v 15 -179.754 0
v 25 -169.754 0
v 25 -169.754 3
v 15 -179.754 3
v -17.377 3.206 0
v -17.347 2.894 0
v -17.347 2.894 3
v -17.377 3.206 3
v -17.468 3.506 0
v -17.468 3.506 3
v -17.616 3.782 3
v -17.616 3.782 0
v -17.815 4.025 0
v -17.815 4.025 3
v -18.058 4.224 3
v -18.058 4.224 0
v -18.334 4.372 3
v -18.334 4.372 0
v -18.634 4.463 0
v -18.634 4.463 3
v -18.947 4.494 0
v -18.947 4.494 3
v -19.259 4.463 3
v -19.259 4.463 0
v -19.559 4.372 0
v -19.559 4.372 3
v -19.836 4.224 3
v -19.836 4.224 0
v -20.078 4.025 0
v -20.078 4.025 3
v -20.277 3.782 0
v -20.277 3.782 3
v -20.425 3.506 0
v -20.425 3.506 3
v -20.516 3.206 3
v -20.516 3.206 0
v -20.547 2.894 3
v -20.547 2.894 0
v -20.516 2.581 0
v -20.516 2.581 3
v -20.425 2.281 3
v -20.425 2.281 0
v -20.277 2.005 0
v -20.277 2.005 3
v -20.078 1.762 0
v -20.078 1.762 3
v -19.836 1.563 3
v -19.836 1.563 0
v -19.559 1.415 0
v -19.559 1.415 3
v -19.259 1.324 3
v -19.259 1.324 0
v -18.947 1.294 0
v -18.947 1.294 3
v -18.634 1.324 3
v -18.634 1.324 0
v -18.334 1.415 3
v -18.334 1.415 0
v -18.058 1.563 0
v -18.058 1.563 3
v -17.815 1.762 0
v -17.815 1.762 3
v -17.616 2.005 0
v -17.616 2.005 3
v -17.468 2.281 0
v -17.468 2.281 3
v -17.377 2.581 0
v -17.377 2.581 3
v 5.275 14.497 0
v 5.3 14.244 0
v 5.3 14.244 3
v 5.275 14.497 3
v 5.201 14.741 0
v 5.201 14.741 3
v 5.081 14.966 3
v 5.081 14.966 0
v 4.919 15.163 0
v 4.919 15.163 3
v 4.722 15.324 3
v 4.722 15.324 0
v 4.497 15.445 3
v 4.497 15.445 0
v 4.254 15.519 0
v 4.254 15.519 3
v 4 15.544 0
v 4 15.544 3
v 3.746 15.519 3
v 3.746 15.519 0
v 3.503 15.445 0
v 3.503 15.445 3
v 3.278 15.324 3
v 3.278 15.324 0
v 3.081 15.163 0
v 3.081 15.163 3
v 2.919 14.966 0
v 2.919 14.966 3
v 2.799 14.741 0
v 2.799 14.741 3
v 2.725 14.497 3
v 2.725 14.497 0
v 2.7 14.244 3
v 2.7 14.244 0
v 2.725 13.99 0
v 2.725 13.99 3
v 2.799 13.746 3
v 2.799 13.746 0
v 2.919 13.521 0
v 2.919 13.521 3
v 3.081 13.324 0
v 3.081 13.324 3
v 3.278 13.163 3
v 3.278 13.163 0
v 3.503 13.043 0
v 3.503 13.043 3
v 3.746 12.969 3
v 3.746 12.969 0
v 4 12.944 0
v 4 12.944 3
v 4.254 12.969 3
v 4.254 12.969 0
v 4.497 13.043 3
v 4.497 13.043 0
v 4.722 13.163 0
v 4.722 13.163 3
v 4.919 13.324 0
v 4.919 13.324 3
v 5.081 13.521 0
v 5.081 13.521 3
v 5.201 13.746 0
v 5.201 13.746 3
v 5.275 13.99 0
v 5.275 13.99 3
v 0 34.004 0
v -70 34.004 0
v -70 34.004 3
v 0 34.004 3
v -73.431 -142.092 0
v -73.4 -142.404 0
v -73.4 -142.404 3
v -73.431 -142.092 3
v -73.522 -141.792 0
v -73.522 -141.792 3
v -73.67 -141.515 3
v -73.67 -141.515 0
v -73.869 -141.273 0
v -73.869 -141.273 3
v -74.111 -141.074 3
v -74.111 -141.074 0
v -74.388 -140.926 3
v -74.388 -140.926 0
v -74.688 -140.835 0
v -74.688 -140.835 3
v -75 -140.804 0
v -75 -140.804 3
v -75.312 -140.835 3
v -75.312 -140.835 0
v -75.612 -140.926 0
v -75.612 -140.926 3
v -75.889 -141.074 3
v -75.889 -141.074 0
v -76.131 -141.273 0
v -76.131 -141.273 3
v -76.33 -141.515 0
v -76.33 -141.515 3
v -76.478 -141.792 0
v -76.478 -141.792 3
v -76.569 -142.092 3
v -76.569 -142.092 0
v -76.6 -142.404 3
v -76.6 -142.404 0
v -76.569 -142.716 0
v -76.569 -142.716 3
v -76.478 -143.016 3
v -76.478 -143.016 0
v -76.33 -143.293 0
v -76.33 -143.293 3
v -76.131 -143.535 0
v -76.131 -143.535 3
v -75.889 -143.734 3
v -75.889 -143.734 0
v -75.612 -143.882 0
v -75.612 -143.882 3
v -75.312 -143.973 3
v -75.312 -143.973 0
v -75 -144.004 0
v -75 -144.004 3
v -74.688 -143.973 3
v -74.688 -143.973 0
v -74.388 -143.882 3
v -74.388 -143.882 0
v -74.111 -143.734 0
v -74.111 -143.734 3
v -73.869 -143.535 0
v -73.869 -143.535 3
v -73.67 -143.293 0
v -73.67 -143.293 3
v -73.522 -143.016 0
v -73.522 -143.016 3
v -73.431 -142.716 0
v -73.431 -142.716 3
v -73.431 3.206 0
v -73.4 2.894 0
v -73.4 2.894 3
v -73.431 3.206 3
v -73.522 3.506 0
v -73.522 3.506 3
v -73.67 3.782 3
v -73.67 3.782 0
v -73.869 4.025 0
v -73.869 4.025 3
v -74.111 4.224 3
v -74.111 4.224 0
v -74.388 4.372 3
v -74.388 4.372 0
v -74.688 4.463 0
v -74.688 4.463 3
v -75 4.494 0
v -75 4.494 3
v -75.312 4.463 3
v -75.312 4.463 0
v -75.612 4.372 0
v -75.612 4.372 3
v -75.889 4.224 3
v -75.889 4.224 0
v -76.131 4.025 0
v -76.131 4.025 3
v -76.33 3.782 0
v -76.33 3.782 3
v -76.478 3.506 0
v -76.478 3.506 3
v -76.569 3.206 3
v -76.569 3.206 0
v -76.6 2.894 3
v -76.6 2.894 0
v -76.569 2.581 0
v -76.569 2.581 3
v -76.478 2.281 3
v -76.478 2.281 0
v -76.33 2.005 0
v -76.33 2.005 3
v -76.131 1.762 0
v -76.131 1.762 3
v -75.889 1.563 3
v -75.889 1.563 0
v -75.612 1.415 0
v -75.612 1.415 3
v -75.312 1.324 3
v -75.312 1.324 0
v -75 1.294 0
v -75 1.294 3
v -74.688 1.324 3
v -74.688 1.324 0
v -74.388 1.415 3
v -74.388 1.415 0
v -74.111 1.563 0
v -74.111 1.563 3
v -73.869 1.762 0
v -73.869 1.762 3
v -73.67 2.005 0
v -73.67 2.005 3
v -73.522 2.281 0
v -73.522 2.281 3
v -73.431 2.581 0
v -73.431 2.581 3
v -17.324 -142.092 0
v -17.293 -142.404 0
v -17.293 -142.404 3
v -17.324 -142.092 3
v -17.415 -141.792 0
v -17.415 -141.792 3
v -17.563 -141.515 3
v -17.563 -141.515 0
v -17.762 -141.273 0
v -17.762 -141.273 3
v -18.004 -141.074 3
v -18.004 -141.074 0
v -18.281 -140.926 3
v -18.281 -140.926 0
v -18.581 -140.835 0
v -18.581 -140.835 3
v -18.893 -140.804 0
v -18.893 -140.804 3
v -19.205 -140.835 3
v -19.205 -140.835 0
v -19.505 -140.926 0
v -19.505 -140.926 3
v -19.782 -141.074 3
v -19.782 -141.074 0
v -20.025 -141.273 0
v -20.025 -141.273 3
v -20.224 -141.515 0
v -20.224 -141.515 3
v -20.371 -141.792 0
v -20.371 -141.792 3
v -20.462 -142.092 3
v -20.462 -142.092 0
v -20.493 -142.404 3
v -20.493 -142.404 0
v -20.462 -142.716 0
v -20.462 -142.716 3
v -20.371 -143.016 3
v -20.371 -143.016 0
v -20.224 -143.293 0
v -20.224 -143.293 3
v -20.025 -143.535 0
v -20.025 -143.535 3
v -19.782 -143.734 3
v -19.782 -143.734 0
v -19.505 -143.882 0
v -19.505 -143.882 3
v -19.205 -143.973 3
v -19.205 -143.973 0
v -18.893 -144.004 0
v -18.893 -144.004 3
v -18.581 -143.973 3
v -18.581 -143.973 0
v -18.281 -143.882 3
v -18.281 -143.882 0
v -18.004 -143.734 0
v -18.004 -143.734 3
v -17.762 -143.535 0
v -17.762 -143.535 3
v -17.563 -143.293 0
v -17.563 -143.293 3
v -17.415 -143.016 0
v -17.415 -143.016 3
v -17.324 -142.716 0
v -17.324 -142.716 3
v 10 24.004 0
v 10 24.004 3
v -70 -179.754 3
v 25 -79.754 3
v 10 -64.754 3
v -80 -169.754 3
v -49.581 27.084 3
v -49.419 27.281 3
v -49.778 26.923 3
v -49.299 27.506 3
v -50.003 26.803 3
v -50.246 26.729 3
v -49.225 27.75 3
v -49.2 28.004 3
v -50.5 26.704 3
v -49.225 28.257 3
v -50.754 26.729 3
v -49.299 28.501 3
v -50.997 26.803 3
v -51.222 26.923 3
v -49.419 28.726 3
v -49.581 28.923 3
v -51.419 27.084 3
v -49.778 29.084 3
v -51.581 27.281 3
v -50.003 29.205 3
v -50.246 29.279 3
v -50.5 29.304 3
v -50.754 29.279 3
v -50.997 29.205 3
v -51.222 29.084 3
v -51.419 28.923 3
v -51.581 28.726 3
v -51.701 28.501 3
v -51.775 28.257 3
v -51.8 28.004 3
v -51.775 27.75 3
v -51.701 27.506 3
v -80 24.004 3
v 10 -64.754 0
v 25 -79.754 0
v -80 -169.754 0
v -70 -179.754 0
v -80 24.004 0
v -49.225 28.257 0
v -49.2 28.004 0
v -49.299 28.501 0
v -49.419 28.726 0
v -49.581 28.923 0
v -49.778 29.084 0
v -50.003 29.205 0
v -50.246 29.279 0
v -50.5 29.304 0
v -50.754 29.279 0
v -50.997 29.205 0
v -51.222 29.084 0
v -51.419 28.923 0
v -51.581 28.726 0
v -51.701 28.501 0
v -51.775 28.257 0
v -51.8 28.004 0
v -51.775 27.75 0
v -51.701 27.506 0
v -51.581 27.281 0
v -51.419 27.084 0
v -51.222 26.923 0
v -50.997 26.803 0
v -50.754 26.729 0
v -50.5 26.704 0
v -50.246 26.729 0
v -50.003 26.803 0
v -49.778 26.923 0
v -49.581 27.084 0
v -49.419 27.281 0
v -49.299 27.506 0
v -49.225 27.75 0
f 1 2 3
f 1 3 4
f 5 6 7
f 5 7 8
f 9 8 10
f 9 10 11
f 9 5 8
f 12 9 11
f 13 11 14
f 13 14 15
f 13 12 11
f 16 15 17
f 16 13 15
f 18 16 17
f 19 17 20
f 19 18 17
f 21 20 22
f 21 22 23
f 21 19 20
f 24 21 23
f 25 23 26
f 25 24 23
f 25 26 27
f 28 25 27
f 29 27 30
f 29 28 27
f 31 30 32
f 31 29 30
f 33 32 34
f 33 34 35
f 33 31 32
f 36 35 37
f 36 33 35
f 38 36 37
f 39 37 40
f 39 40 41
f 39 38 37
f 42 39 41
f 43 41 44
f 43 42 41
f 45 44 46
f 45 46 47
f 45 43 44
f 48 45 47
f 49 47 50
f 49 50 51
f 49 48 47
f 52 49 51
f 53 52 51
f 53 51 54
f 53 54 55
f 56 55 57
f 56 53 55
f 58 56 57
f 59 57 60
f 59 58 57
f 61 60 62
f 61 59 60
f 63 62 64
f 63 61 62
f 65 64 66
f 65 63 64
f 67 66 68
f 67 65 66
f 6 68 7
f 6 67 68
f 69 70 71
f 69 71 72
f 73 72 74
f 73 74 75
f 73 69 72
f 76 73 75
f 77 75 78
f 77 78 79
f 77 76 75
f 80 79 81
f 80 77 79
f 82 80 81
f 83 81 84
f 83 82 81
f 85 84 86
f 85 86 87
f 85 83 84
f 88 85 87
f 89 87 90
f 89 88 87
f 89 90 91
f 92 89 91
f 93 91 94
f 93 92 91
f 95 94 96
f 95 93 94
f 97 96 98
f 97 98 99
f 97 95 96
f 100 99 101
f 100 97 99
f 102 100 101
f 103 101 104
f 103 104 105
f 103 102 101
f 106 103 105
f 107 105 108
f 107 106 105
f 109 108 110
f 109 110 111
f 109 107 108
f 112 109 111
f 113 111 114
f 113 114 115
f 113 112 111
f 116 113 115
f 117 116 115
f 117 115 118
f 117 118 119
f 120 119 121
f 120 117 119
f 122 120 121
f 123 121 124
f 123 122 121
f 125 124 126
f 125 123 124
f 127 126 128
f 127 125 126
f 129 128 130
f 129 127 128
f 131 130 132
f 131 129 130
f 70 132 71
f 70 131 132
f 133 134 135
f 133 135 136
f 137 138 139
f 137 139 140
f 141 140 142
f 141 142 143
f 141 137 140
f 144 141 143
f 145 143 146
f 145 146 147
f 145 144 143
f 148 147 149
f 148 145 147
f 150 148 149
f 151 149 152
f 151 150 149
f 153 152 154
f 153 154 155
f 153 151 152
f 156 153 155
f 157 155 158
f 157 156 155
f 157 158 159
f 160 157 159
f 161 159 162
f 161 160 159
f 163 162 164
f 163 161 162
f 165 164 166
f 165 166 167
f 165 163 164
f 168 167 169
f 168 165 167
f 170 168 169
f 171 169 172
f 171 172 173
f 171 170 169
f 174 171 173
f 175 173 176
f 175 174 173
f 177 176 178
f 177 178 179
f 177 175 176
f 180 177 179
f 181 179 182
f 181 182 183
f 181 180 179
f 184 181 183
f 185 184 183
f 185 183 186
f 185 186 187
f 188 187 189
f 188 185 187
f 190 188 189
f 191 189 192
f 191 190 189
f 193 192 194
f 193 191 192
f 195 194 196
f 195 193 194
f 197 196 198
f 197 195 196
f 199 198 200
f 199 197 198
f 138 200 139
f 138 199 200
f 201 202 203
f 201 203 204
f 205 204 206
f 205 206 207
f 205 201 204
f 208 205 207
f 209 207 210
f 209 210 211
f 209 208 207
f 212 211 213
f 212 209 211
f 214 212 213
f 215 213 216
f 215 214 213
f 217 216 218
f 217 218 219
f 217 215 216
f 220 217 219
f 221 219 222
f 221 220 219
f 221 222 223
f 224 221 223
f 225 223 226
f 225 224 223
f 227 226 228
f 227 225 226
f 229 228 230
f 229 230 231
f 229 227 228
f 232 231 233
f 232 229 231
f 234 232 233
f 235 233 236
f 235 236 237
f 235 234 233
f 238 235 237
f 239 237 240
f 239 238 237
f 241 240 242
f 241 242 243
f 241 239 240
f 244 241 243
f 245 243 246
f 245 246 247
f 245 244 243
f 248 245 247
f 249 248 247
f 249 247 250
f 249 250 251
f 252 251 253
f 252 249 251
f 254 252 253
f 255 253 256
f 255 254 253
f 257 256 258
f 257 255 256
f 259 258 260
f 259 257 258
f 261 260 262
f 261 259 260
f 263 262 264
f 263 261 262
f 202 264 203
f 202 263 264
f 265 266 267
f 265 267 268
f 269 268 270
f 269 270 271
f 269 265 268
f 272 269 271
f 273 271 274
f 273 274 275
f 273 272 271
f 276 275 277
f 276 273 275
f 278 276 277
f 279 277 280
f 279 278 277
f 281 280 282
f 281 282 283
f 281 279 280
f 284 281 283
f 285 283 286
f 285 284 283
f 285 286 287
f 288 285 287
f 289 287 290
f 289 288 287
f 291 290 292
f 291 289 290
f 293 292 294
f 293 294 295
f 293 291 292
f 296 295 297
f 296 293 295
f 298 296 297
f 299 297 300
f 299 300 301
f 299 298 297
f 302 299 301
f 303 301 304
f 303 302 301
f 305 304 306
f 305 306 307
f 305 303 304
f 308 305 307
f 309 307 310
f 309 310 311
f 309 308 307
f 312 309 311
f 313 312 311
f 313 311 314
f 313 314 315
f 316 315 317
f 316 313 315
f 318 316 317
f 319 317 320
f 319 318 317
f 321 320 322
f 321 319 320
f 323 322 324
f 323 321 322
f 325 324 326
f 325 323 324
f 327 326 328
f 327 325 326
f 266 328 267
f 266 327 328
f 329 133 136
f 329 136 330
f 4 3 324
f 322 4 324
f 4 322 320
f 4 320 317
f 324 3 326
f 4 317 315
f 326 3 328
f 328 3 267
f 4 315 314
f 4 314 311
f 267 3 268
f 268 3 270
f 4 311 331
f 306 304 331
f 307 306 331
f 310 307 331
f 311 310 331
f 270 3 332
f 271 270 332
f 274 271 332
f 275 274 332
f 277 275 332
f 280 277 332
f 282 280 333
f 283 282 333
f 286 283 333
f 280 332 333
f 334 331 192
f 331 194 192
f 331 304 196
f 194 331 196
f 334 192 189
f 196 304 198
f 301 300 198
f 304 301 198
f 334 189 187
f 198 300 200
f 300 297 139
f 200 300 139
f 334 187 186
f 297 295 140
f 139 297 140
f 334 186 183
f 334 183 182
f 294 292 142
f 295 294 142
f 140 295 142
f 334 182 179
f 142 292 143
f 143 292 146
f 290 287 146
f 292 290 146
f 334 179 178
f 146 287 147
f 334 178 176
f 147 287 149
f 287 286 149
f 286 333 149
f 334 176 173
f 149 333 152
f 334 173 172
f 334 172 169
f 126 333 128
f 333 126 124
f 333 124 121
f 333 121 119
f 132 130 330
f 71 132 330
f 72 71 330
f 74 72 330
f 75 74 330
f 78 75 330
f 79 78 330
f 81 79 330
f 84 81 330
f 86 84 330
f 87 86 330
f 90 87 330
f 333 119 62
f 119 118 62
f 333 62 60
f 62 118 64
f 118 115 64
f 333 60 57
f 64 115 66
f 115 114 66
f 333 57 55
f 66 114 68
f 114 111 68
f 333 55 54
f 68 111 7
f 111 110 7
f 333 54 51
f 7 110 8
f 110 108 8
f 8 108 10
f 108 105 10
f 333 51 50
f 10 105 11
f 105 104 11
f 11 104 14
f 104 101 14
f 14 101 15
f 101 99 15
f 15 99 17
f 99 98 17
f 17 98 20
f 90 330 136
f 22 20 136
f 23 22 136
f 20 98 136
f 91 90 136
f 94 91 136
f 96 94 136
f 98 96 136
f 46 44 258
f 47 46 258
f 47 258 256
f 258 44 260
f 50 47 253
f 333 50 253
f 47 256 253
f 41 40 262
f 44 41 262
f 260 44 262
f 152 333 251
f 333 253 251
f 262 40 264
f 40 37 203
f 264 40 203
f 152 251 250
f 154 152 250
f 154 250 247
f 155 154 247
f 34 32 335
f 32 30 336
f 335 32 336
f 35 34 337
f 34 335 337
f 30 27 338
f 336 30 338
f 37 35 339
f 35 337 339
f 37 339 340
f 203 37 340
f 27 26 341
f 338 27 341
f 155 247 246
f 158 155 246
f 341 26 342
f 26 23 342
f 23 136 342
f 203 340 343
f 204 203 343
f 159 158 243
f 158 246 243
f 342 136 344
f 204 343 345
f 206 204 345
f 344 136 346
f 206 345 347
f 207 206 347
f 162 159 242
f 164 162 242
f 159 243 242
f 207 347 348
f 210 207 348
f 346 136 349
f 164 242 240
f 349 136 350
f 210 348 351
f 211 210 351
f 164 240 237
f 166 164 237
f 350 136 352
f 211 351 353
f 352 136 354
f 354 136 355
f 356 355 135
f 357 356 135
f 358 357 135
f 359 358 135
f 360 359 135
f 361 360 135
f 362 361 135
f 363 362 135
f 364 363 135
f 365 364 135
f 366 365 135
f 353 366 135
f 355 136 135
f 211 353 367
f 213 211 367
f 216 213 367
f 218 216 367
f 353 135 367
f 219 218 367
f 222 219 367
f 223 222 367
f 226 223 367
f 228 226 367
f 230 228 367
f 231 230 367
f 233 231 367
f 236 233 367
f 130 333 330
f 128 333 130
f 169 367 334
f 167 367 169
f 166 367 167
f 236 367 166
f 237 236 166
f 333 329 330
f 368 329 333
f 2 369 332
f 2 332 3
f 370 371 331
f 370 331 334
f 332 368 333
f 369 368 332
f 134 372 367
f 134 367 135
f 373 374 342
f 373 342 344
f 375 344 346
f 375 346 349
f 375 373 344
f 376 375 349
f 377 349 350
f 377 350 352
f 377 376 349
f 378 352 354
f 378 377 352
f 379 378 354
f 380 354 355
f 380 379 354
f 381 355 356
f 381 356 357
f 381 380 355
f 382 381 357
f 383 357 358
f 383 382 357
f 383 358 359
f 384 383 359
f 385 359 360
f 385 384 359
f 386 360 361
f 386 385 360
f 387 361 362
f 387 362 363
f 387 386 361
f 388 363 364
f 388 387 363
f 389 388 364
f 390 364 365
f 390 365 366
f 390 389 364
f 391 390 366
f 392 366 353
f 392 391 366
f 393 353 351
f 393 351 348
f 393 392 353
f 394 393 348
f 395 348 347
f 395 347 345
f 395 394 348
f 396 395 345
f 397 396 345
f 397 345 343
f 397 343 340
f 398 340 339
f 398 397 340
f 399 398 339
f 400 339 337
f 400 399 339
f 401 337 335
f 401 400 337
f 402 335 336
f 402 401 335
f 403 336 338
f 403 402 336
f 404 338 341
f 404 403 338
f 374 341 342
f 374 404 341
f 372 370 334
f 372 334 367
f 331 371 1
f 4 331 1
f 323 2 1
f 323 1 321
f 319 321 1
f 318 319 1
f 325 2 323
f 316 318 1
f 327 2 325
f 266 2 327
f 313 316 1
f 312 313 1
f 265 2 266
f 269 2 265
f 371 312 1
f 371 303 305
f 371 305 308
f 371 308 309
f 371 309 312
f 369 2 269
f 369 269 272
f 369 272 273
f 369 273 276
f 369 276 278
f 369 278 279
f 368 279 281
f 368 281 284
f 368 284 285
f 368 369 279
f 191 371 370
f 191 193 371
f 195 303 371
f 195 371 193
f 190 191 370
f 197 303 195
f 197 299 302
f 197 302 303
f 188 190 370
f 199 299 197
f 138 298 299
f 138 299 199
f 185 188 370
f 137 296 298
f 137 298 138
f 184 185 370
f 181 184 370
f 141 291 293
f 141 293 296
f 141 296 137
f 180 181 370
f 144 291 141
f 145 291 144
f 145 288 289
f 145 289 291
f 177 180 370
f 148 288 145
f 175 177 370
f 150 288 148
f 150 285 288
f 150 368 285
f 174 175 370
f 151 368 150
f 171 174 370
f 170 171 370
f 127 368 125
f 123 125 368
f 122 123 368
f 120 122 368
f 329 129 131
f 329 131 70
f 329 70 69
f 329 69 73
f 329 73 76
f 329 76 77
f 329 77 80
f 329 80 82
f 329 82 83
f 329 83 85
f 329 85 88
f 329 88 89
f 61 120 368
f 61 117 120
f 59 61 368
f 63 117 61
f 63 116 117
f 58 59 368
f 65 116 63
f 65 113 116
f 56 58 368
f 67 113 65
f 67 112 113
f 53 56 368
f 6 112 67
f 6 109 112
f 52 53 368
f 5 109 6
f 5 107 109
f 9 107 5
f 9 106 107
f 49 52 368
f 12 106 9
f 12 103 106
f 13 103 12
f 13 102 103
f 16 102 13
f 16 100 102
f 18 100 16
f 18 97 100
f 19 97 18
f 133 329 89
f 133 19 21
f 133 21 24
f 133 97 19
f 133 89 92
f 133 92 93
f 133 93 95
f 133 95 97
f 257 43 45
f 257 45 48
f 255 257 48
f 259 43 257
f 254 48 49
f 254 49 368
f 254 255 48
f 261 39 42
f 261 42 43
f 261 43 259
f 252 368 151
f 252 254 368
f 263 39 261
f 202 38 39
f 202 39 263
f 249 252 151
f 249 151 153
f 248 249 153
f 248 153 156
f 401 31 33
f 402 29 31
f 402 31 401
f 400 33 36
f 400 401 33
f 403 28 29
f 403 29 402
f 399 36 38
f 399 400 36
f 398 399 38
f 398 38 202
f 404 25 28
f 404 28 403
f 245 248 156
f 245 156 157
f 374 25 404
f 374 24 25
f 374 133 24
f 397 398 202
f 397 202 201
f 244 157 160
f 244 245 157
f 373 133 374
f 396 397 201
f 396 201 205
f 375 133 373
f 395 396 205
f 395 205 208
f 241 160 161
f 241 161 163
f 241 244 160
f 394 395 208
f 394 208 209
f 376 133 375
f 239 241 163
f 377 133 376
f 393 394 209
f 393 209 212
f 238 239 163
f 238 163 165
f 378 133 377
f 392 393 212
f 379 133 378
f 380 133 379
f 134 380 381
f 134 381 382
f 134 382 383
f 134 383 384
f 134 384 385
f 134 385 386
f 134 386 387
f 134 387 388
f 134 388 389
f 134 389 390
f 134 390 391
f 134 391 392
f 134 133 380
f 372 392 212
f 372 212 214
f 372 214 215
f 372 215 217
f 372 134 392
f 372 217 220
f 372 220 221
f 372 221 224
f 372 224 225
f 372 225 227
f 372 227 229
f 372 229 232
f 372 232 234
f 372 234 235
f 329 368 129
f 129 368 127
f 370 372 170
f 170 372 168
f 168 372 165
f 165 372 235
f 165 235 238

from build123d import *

# Parameters (mm, degrees)
SKETCH1_R      = 1.6
SKETCH1_R_2    = 1.3
EXTRUDE1_DEPTH = 3


with BuildPart() as part:
    # Sketch1 → Extrude1 (new body)
    with BuildSketch(Plane.XY):
        Polygon((-70, 34.003545781), (0, 34.003545781), (10, 24.003545781), (10, -64.753959847), (25, -79.753959847), (25, -169.753959847), (15, -179.753959847), (0, -179.753959847), (-70, -179.753959847), (-80, -169.753959847), (-80, 24.003545781), align=None)
        with Locations((-75, 2.893545781)):
            Circle(SKETCH1_R, mode=Mode.SUBTRACT)
        with Locations((-18.946632771, 2.893545781)):
            Circle(SKETCH1_R, mode=Mode.SUBTRACT)
        with Locations((-75, -142.403959847)):
            Circle(SKETCH1_R, mode=Mode.SUBTRACT)
        with Locations((-18.893164364, -142.403959847)):
            Circle(SKETCH1_R, mode=Mode.SUBTRACT)
        with Locations((4, 14.243545781)):
            Circle(SKETCH1_R_2, mode=Mode.SUBTRACT)
        with Locations((-50.5, 28.003545781)):
            Circle(SKETCH1_R_2, mode=Mode.SUBTRACT)
    extrude(amount=EXTRUDE1_DEPTH)


solid = part.part
